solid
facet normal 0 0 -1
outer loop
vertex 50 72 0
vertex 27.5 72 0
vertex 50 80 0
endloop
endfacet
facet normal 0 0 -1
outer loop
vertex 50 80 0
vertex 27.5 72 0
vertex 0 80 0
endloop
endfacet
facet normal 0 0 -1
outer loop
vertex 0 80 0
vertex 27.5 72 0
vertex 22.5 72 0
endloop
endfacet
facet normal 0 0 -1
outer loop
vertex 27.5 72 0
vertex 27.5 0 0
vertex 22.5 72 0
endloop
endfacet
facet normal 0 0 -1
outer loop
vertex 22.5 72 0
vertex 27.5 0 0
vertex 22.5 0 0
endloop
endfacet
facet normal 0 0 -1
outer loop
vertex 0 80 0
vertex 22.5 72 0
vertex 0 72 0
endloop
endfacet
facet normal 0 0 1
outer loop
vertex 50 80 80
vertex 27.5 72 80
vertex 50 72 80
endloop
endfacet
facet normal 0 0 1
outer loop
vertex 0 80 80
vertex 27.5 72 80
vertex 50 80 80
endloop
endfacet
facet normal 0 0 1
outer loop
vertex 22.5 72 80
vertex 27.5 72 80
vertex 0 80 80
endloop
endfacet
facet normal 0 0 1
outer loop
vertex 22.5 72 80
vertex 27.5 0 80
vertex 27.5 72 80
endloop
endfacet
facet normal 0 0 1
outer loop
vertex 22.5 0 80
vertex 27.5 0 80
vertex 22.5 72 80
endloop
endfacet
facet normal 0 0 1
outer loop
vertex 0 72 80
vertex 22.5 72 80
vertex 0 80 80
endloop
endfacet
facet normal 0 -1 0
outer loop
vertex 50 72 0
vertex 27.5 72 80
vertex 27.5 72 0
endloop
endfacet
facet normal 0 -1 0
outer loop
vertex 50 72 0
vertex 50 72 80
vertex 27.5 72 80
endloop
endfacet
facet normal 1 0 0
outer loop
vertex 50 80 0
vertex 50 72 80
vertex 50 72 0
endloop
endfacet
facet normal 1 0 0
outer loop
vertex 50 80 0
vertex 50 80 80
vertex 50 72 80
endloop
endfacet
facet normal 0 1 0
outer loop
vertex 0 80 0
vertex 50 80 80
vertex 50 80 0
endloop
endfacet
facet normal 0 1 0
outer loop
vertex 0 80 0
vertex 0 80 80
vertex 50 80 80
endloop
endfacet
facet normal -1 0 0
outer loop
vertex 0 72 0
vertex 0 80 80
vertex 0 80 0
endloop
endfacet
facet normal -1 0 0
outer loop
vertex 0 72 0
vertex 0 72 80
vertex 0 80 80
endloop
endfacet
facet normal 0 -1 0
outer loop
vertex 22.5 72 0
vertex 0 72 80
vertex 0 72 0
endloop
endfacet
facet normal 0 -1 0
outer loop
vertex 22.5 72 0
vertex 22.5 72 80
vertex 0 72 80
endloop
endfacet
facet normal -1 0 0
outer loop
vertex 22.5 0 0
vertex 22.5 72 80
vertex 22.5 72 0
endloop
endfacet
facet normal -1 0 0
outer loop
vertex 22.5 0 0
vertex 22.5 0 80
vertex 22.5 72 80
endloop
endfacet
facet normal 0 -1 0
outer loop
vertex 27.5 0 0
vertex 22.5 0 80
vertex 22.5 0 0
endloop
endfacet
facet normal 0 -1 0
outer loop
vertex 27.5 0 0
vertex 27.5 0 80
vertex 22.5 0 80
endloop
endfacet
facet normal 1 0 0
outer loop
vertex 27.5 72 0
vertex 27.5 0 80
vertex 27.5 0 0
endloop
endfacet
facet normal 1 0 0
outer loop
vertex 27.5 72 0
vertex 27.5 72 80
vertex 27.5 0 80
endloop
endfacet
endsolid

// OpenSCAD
$fn = 32;

// ----------------------------------------------------------------------
// Structural section: tee 50 x 80 mm
// ----------------------------------------------------------------------

// --- parameters (mm) ---
sec_w = 50;               // tee width, X
sec_h = 80;               // tee height, Y
flange_t = 8;             // top flange thickness
web_t = 5;                // web thickness
plate_t = 80;             // cut length, Z (extrusion height)

profile = [[22.5, 0], [27.5, 0], [27.5, 72], [50, 72], [50, 80], [0, 80], [0, 72], [22.5, 72]];  // primary outline, 8 points, counter clockwise

// --- the one profile operation ---
linear_extrude(height = plate_t) polygon(points = profile);
